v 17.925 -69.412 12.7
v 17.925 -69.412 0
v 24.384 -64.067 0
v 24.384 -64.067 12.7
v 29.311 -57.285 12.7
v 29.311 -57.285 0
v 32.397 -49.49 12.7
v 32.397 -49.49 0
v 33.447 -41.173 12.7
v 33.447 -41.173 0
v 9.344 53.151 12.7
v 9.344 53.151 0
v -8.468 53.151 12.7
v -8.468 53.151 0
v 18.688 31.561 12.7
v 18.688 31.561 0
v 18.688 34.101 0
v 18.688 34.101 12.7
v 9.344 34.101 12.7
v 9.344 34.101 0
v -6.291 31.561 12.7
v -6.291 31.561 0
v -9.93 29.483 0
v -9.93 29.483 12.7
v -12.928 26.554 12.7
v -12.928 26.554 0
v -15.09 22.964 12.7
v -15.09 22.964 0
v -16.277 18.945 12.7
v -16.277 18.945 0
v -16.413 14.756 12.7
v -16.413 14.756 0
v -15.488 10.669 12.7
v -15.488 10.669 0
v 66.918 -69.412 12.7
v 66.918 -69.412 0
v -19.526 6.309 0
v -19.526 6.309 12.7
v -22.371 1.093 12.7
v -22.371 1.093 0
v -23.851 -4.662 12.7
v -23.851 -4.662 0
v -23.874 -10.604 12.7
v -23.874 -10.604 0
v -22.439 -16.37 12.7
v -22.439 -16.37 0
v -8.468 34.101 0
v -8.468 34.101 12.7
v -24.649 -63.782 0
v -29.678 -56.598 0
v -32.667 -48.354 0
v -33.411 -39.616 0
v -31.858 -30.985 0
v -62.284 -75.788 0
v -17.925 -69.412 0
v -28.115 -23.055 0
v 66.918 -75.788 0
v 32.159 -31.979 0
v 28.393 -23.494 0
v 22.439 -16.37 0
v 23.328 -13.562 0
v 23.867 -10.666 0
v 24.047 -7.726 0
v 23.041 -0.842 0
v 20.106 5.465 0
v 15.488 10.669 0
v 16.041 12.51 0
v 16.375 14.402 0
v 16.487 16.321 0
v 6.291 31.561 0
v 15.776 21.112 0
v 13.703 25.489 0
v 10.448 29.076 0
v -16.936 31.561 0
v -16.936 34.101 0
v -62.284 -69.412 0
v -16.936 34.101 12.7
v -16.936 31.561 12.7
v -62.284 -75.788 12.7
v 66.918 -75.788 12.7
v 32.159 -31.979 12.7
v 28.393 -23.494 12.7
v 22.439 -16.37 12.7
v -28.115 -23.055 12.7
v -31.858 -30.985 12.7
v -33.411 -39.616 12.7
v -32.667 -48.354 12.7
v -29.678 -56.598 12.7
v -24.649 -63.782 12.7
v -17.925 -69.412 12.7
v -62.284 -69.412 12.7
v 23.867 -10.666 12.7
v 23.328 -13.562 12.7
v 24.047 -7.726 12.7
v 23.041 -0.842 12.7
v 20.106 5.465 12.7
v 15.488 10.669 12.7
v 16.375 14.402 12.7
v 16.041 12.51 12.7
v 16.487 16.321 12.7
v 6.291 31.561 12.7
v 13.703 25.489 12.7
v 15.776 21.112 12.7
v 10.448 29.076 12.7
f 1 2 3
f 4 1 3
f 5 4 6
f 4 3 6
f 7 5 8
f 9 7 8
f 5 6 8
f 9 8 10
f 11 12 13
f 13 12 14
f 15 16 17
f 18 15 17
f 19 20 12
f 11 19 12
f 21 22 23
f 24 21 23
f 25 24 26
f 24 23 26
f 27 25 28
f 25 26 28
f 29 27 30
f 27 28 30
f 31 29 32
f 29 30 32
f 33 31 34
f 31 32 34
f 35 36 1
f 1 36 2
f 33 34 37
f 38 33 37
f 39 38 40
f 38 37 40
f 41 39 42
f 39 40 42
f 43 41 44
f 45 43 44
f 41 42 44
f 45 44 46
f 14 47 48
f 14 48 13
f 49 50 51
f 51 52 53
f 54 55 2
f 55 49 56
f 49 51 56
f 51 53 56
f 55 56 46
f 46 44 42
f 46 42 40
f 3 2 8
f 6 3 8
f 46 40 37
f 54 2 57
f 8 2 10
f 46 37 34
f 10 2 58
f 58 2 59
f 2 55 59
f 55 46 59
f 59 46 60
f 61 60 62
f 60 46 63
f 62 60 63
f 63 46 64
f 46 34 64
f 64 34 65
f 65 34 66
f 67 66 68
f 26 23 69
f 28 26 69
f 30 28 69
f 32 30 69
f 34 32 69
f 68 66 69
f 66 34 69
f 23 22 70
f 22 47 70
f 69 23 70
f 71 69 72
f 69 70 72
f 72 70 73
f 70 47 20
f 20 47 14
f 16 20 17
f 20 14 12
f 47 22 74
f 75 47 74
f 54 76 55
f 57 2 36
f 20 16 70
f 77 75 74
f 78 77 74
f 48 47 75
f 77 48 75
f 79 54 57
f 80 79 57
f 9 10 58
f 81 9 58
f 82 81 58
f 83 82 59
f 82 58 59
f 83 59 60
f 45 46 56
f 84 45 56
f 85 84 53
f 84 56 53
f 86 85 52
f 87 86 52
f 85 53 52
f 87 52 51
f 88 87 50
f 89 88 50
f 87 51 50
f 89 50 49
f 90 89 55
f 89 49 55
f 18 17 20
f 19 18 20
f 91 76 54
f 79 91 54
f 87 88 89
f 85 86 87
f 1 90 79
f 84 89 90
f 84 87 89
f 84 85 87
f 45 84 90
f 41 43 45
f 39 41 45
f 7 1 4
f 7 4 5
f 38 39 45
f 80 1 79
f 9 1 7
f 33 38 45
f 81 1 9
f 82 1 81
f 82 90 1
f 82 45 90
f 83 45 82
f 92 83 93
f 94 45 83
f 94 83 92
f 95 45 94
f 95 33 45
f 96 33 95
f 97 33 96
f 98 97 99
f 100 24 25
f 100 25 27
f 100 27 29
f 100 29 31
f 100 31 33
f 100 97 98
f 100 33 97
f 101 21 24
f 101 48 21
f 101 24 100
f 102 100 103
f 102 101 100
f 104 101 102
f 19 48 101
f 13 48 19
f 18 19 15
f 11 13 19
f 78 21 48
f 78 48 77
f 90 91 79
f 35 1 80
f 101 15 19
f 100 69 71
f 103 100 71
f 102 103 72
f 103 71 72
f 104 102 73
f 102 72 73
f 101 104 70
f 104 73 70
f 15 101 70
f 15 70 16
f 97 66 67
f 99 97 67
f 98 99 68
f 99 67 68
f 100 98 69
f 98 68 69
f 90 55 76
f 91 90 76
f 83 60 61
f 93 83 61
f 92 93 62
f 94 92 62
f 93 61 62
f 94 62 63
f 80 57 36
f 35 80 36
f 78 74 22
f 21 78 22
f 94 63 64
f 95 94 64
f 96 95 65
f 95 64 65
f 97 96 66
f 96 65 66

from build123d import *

# Parameters (mm, degrees)
F0_W     = 9.3442350626
F0_H     = 19.05
F0_W_2   = 8.4682106972
F1_DEPTH = 12.7


with BuildPart() as f1:
    # F0 (on Top) → F1 (new body)
    with BuildSketch(Plane.XY):
        with Locations((4.6721175313, 43.6261597422)):
            Rectangle(F0_W, F0_H)
        with Locations((-4.2341053486, 43.6261597422)):
            Rectangle(F0_W_2, F0_H)
        with BuildLine():
            Line((-16.9364213943, 31.5611597422), (-6.291250811, 31.5611597422))
            ThreePointArc((-6.291250811, 31.5611597422), (-3.2068706089, 32.4937729406), (0, 32.8086530862))
            Line((0, 32.8086530862), (0, 34.1011597422))
            Line((0, 34.1011597422), (-8.4682106972, 34.1011597422))
            Line((-8.4682106972, 34.1011597422), (-16.9364213943, 34.1011597422))
            Line((-16.9364213943, 34.1011597422), (-16.9364213943, 31.5611597422))
        make_face()
        with BuildLine():
            Line((0, 34.1011597422), (0, 32.8086530862))
            ThreePointArc((0, 32.8086530862), (3.2068706089, 32.4937729406), (6.291250811, 31.5611597422))
            Line((6.291250811, 31.5611597422), (18.6884663999, 31.5611597422))
            Line((18.6884663999, 31.5611597422), (18.6884663999, 34.1011597422))
            Line((18.6884663999, 34.1011597422), (9.3442350626, 34.1011597422))
            Line((9.3442350626, 34.1011597422), (0, 34.1011597422))
        make_face()
        with BuildLine():
            ThreePointArc((-6.291250811, 31.5611597422), (-15.090040572, 22.9640591319), (-15.4883746602, 10.6689312302))
            ThreePointArc((-15.4883746602, 10.6689312302), (0, 16.3211597422), (15.4883746602, 10.6689312302))
            ThreePointArc((15.4883746602, 10.6689312302), (16.2357924181, 13.4512326832), (16.4874933439, 16.3211597422))
            ThreePointArc((16.4874933439, 16.3211597422), (13.703364416, 25.4893242504), (6.291250811, 31.5611597422))
            Line((6.291250811, 31.5611597422), (0, 31.5611597422))
            Line((0, 31.5611597422), (-6.291250811, 31.5611597422))
        make_face()
        with BuildLine():
            ThreePointArc((-22.4394999049, -16.3700398839), (0, -7.7257658365), (22.4394999049, -16.3700398839))
            ThreePointArc((22.4394999049, -16.3700398839), (23.6416540668, -12.1219940808), (24.0469255787, -7.7257658365))
            ThreePointArc((24.0469255787, -7.7257658365), (21.8025505684, 2.4183663837), (15.4883746602, 10.6689312302))
            ThreePointArc((15.4883746602, 10.6689312302), (0, -0.1663336017), (-15.4883746602, 10.6689312302))
            ThreePointArc((-15.4883746602, 10.6689312302), (-23.2896416242, -1.7385108055), (-22.4394999049, -16.3700398839))
        make_face()
        with BuildLine():
            ThreePointArc((17.9249304532, -69.4115906954), (29.3109138189, -57.2848201084), (33.4472638545, -41.173029691))
            ThreePointArc((33.4472638545, -41.173029691), (30.5717135064, -27.605060328), (22.4394999049, -16.3700398839))
            ThreePointArc((22.4394999049, -16.3700398839), (0, -31.7726914152), (-22.4394999049, -16.3700398839))
            ThreePointArc((-22.4394999049, -16.3700398839), (-33.3267660846, -44.0095983393), (-17.9249304532, -69.4115906954))
            Line((-17.9249304532, -69.4115906954), (17.9249304532, -69.4115906954))
        make_face()
        with BuildLine():
            ThreePointArc((-22.4394999049, -16.3700398839), (0, -31.7726914152), (22.4394999049, -16.3700398839))
            ThreePointArc((22.4394999049, -16.3700398839), (0, -7.7257658365), (-22.4394999049, -16.3700398839))
        make_face()
        with BuildLine():
            ThreePointArc((15.4883746602, 10.6689312302), (0, 16.3211597422), (-15.4883746602, 10.6689312302))
            ThreePointArc((-15.4883746602, 10.6689312302), (0, -0.1663336017), (15.4883746602, 10.6689312302))
        make_face()
        with BuildLine():
            ThreePointArc((6.291250811, 31.5611597422), (3.2068706089, 32.4937729406), (0, 32.8086530862))
            Line((0, 32.8086530862), (0, 31.5611597422))
            Line((0, 31.5611597422), (6.291250811, 31.5611597422))
        make_face()
        with BuildLine():
            ThreePointArc((0, 32.8086530862), (-3.2068706089, 32.4937729406), (-6.291250811, 31.5611597422))
            Line((-6.291250811, 31.5611597422), (0, 31.5611597422))
            Line((0, 31.5611597422), (0, 32.8086530862))
        make_face()
        with BuildLine():
            Line((66.9182538986, -69.4115906954), (17.9249304532, -69.4115906954))
            ThreePointArc((17.9249304532, -69.4115906954), (0, -74.6202935455), (-17.9249304532, -69.4115906954))
            Line((-17.9249304532, -69.4115906954), (-62.283821404, -69.4115906954))
            Line((-62.283821404, -69.4115906954), (-62.283821404, -75.7877975702))
            Line((-62.283821404, -75.7877975702), (66.9182538986, -75.7877975702))
            Line((66.9182538986, -75.7877975702), (66.9182538986, -69.4115906954))
        make_face()
        with BuildLine():
            ThreePointArc((-17.9249304532, -69.4115906954), (0, -74.6202935455), (17.9249304532, -69.4115906954))
            Line((17.9249304532, -69.4115906954), (-17.9249304532, -69.4115906954))
        make_face()
    extrude(amount=F1_DEPTH)


solid = f1.part
